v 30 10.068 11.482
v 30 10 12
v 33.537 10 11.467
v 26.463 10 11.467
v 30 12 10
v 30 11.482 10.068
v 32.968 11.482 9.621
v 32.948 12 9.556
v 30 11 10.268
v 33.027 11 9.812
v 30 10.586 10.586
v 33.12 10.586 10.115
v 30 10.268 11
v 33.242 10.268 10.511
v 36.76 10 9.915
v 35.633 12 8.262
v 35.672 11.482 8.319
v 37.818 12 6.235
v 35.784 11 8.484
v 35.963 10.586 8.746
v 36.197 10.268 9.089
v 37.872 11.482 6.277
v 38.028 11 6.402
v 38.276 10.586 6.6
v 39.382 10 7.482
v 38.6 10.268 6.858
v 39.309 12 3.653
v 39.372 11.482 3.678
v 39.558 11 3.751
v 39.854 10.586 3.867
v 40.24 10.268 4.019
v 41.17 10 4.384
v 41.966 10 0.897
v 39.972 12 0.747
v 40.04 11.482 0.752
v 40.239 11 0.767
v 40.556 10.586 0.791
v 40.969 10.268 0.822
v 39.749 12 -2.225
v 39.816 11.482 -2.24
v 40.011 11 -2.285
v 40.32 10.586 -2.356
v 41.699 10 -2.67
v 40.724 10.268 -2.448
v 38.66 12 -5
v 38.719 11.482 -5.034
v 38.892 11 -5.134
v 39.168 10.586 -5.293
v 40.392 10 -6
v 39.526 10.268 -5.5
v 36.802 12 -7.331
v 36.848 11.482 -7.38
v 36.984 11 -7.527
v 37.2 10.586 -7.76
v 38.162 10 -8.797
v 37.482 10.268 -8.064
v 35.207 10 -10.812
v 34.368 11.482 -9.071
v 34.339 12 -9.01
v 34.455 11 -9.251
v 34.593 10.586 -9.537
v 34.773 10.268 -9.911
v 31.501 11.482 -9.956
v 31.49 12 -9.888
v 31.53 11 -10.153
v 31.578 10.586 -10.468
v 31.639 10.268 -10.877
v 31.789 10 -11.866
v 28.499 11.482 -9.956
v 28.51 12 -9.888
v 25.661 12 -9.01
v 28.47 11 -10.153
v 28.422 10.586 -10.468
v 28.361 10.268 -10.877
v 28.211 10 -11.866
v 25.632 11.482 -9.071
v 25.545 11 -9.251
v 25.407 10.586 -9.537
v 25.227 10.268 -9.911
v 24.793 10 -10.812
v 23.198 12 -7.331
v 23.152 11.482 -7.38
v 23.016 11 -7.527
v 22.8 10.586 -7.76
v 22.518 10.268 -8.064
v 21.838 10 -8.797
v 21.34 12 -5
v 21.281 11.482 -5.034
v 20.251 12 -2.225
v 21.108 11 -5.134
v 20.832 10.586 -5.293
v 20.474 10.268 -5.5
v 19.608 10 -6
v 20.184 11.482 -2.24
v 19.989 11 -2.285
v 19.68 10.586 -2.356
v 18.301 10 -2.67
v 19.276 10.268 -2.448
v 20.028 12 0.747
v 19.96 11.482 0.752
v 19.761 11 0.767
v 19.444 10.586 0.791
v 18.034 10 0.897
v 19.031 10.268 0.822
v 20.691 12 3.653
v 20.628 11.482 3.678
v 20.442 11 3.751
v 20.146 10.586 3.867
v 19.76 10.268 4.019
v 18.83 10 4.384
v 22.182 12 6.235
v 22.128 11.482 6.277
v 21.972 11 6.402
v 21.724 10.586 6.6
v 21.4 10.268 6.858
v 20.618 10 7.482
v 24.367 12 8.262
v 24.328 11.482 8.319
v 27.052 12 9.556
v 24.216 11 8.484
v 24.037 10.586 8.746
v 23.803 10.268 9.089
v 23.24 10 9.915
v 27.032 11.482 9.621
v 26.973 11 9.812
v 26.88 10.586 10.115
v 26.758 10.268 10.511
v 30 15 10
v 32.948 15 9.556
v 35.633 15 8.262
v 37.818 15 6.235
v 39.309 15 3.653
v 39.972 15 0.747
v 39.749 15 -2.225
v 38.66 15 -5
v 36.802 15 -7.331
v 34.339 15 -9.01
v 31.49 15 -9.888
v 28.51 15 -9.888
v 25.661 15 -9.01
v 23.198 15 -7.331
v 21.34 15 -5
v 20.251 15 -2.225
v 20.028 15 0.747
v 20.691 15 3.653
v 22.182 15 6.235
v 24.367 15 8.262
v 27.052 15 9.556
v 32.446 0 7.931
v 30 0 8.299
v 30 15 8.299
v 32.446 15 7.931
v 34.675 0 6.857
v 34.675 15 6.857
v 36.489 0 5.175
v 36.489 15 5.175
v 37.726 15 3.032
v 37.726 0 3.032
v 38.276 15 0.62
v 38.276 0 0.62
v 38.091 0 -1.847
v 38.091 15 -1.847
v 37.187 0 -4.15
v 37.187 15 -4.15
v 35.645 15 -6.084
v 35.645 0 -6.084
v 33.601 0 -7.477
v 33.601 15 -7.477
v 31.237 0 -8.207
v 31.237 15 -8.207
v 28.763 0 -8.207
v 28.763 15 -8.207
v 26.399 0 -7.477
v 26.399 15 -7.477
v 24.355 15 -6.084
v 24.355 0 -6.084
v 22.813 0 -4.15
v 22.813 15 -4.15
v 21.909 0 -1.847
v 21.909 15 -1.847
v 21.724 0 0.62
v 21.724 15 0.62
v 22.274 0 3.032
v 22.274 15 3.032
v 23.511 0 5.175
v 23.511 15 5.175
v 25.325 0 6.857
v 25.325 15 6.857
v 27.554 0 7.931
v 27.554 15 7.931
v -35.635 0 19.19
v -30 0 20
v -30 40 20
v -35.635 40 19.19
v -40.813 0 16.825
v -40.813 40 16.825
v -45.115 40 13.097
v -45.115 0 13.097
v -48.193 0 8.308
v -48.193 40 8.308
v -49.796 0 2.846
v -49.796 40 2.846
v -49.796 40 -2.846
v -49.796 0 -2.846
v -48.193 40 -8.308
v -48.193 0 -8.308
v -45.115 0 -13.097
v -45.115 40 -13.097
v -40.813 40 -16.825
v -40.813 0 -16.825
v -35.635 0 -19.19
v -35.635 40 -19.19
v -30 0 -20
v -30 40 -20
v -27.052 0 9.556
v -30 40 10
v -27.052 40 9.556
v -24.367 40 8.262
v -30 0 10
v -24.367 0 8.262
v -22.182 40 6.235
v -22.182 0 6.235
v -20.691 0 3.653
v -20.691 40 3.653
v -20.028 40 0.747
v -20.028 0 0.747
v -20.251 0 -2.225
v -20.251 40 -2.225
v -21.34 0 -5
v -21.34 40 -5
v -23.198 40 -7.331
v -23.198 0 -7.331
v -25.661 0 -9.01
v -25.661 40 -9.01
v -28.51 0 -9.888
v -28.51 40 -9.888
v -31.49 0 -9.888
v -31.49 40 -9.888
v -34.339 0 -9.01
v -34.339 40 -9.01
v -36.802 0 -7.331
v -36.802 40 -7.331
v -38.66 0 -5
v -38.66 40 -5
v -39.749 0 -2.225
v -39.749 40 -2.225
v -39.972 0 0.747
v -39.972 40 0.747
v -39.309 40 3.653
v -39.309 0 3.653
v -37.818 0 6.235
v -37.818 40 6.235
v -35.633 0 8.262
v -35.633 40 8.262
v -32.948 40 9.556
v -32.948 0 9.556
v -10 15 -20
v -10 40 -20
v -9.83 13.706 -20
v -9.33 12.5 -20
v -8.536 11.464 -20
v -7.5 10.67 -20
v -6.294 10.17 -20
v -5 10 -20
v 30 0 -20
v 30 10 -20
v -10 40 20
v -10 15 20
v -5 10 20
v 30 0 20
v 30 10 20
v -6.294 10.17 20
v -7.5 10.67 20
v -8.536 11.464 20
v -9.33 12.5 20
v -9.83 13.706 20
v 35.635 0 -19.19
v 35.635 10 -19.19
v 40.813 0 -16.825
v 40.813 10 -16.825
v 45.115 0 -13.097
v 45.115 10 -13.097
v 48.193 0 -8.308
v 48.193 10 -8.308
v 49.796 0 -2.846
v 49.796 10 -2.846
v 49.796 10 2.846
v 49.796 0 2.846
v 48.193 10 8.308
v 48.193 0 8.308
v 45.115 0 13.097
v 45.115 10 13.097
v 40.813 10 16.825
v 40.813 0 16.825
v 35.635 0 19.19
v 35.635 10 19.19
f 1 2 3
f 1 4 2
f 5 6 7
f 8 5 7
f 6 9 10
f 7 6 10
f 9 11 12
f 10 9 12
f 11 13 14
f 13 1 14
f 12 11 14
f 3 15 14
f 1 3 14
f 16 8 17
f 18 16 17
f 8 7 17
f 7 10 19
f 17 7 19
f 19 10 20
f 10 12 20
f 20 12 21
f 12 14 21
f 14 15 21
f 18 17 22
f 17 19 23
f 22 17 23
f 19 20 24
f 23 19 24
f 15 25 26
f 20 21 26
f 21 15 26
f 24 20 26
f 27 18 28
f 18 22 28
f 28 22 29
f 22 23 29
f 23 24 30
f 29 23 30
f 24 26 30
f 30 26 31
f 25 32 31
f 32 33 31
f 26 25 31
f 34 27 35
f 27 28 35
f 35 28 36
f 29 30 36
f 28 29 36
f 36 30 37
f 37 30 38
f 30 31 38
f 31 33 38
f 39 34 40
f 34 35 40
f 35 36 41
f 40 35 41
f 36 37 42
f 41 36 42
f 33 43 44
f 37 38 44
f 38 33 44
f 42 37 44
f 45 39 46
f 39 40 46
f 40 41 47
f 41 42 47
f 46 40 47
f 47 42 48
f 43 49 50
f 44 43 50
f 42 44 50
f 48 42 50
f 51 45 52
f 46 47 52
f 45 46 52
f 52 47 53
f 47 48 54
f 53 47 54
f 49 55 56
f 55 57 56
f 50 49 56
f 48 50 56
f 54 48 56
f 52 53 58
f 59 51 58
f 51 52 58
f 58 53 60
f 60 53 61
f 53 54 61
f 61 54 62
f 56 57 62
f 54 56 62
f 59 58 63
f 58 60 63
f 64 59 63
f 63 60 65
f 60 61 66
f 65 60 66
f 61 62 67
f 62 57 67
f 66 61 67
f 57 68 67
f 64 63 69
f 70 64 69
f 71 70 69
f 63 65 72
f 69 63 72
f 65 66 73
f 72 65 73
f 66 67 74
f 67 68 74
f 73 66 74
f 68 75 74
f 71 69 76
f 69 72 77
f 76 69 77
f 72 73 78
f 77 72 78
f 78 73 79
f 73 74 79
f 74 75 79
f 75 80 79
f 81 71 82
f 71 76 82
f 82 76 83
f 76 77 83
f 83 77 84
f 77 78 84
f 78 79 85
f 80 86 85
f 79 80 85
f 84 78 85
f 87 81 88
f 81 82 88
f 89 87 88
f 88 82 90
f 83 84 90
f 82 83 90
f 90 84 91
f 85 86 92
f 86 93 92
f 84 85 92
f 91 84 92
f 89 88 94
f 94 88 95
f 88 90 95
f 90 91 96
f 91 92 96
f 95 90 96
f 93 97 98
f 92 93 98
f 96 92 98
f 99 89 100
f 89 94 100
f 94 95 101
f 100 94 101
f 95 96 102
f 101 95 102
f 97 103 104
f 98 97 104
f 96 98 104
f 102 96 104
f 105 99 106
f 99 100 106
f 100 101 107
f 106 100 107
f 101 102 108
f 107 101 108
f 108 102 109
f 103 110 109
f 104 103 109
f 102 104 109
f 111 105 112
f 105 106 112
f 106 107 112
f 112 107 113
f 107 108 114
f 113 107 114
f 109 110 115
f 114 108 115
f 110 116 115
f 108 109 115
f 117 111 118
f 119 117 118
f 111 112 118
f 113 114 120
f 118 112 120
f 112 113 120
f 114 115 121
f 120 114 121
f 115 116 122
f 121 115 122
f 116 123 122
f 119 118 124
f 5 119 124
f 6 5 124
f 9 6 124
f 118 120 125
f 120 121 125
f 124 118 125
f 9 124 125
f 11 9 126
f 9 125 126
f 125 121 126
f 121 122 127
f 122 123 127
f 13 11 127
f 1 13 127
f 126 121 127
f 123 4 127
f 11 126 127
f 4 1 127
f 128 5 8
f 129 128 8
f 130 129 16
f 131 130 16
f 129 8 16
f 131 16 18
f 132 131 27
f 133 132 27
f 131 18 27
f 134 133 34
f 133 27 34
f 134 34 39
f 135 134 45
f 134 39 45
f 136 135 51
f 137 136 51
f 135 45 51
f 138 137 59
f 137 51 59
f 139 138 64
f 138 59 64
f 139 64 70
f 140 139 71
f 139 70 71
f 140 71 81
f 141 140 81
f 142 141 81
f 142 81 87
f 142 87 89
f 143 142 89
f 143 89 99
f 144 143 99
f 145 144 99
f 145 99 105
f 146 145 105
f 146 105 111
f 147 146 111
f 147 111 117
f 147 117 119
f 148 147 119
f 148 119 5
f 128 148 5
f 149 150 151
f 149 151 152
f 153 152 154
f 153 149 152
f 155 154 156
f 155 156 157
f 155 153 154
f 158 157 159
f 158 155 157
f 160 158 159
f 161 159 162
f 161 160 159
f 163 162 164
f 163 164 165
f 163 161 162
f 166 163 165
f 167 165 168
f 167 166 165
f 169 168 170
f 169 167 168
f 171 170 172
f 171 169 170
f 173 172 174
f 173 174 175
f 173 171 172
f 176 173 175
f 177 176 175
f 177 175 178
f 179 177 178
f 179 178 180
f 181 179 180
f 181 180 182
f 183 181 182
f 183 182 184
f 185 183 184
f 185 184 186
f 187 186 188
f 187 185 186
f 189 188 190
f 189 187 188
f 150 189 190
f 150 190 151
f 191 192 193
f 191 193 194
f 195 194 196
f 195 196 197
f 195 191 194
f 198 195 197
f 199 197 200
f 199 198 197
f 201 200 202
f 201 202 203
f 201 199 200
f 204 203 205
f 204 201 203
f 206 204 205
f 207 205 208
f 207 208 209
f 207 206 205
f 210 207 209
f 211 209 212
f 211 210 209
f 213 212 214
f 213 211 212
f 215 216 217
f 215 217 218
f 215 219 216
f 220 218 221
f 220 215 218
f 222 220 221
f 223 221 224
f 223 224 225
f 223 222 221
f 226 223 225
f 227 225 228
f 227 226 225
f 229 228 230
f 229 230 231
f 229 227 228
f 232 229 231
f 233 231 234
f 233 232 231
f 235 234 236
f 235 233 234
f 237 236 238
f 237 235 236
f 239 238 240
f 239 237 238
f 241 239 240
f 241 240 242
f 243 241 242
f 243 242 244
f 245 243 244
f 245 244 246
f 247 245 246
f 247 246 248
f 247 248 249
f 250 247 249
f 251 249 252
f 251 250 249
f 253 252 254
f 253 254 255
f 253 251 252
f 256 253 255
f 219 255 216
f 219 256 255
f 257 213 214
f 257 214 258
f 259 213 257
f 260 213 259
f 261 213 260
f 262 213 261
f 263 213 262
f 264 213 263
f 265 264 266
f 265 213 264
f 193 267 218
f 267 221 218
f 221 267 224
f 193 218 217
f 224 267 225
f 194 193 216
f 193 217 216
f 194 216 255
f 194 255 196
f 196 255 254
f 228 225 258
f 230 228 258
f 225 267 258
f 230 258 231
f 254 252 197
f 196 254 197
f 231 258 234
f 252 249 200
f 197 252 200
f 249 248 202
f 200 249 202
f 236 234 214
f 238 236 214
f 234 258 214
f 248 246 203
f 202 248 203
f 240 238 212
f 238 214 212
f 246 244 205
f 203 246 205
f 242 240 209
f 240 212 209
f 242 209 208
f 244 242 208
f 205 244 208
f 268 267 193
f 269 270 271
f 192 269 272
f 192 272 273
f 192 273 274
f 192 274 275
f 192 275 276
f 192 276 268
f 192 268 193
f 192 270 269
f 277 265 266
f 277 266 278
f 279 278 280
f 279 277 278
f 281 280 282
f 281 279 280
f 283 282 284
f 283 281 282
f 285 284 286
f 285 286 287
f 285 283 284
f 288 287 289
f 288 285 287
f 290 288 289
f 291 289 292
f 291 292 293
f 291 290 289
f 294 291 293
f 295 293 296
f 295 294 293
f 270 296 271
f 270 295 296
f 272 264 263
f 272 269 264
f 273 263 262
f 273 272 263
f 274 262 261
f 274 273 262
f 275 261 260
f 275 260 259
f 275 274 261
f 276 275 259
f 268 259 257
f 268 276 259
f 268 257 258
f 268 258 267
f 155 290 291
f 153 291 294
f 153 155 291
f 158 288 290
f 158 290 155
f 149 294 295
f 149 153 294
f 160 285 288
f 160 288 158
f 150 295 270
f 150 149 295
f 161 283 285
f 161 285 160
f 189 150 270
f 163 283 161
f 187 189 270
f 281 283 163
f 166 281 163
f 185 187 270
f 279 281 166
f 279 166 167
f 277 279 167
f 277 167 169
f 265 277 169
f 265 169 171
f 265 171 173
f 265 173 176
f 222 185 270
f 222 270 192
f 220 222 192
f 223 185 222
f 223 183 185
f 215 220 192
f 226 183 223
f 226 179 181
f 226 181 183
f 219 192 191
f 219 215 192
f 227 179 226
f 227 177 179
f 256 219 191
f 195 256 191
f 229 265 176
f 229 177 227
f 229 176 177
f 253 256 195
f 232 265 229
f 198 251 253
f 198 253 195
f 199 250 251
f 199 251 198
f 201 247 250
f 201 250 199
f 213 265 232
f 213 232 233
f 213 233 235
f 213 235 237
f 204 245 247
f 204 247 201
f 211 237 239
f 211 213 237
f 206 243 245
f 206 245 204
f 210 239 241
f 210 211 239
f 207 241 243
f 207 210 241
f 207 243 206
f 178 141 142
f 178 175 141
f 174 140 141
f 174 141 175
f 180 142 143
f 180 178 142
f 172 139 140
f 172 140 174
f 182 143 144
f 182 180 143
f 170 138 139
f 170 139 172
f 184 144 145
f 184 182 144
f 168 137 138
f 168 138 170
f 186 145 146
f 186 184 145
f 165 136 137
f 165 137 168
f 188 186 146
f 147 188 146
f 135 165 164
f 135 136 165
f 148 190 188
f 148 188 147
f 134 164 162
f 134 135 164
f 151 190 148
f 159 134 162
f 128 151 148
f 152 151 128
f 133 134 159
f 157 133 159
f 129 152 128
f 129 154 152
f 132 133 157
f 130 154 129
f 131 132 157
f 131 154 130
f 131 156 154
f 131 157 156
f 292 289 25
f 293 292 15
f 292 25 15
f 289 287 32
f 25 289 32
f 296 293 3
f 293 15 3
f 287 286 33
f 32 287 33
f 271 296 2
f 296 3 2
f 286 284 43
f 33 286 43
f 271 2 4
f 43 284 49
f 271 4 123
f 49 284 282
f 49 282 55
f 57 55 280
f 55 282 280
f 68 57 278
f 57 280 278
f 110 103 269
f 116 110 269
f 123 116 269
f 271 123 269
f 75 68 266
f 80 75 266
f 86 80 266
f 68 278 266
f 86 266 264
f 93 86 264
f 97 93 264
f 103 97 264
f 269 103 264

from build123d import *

# Parameters (mm, degrees)
SKETCH1_R           = 10
BOSS_EXTRUDE1_DEPTH = 10
SKETCH2_R           = 10
BOSS_EXTRUDE2_DEPTH = 30
SKETCH1_3_R         = 10
SKETCH1_3_R_2       = 8.299382461
BOSS_EXTRUDE3_DEPTH = 15
FILLET1_R           = 2
FILLET2_R           = 5


with BuildPart() as part:
    # Sketch1 → Boss-Extrude1 (new body)
    with BuildSketch(Plane(origin=(0, 0, 0), x_dir=(1, 0, 0), z_dir=(0, 1, 0))):
        with BuildLine():
            Line((-30, 20), (30, 20))
            ThreePointArc((30, 20), (50, 0), (30, -20))
            Line((30, -20), (-30, -20))
            ThreePointArc((-30, -20), (-50, 0), (-30, 20))
        make_face()
        with Locations((-30, 0)):
            Circle(SKETCH1_R, mode=Mode.SUBTRACT)
        with Locations((30, 0)):
            Circle(SKETCH1_R, mode=Mode.SUBTRACT)
    extrude(amount=BOSS_EXTRUDE1_DEPTH)

    # Sketch2 → Boss-Extrude2 (add)
    with BuildSketch(Plane(origin=(0, 10, 0), x_dir=(1, 0, 0), z_dir=(0, 1, 0))):
        with BuildLine():
            Line((-10, -20), (-30, -20))
            ThreePointArc((-30, -20), (-50, 0), (-30, 20))
            Line((-30, 20), (-10, 20))
            Line((-10, 20), (-10, -20))
        make_face()
        with Locations((-30, 0)):
            Circle(SKETCH2_R, mode=Mode.SUBTRACT)
    extrude(amount=BOSS_EXTRUDE2_DEPTH)

    # Sketch1<3> → Boss-Extrude3 (add)
    with BuildSketch(Plane(origin=(0, 0, 0), x_dir=(1, 0, 0), z_dir=(0, 1, 0))):
        with Locations((30, 0)):
            Circle(SKETCH1_3_R)
        with Locations((30, 0)):
            Circle(SKETCH1_3_R_2, mode=Mode.SUBTRACT)
    extrude(amount=BOSS_EXTRUDE3_DEPTH)

    # Fillet1
    fillet1_edges = [part.edges().sort_by_distance(p)[0] for p in [
        (20, 10, 0),
    ]]
    fillet(fillet1_edges, radius=FILLET1_R)

    # Fillet2
    fillet2_edges = [part.edges().sort_by_distance(p)[0] for p in [
        (-10, 10, 0),
    ]]
    fillet(fillet2_edges, radius=FILLET2_R)


solid = part.part
